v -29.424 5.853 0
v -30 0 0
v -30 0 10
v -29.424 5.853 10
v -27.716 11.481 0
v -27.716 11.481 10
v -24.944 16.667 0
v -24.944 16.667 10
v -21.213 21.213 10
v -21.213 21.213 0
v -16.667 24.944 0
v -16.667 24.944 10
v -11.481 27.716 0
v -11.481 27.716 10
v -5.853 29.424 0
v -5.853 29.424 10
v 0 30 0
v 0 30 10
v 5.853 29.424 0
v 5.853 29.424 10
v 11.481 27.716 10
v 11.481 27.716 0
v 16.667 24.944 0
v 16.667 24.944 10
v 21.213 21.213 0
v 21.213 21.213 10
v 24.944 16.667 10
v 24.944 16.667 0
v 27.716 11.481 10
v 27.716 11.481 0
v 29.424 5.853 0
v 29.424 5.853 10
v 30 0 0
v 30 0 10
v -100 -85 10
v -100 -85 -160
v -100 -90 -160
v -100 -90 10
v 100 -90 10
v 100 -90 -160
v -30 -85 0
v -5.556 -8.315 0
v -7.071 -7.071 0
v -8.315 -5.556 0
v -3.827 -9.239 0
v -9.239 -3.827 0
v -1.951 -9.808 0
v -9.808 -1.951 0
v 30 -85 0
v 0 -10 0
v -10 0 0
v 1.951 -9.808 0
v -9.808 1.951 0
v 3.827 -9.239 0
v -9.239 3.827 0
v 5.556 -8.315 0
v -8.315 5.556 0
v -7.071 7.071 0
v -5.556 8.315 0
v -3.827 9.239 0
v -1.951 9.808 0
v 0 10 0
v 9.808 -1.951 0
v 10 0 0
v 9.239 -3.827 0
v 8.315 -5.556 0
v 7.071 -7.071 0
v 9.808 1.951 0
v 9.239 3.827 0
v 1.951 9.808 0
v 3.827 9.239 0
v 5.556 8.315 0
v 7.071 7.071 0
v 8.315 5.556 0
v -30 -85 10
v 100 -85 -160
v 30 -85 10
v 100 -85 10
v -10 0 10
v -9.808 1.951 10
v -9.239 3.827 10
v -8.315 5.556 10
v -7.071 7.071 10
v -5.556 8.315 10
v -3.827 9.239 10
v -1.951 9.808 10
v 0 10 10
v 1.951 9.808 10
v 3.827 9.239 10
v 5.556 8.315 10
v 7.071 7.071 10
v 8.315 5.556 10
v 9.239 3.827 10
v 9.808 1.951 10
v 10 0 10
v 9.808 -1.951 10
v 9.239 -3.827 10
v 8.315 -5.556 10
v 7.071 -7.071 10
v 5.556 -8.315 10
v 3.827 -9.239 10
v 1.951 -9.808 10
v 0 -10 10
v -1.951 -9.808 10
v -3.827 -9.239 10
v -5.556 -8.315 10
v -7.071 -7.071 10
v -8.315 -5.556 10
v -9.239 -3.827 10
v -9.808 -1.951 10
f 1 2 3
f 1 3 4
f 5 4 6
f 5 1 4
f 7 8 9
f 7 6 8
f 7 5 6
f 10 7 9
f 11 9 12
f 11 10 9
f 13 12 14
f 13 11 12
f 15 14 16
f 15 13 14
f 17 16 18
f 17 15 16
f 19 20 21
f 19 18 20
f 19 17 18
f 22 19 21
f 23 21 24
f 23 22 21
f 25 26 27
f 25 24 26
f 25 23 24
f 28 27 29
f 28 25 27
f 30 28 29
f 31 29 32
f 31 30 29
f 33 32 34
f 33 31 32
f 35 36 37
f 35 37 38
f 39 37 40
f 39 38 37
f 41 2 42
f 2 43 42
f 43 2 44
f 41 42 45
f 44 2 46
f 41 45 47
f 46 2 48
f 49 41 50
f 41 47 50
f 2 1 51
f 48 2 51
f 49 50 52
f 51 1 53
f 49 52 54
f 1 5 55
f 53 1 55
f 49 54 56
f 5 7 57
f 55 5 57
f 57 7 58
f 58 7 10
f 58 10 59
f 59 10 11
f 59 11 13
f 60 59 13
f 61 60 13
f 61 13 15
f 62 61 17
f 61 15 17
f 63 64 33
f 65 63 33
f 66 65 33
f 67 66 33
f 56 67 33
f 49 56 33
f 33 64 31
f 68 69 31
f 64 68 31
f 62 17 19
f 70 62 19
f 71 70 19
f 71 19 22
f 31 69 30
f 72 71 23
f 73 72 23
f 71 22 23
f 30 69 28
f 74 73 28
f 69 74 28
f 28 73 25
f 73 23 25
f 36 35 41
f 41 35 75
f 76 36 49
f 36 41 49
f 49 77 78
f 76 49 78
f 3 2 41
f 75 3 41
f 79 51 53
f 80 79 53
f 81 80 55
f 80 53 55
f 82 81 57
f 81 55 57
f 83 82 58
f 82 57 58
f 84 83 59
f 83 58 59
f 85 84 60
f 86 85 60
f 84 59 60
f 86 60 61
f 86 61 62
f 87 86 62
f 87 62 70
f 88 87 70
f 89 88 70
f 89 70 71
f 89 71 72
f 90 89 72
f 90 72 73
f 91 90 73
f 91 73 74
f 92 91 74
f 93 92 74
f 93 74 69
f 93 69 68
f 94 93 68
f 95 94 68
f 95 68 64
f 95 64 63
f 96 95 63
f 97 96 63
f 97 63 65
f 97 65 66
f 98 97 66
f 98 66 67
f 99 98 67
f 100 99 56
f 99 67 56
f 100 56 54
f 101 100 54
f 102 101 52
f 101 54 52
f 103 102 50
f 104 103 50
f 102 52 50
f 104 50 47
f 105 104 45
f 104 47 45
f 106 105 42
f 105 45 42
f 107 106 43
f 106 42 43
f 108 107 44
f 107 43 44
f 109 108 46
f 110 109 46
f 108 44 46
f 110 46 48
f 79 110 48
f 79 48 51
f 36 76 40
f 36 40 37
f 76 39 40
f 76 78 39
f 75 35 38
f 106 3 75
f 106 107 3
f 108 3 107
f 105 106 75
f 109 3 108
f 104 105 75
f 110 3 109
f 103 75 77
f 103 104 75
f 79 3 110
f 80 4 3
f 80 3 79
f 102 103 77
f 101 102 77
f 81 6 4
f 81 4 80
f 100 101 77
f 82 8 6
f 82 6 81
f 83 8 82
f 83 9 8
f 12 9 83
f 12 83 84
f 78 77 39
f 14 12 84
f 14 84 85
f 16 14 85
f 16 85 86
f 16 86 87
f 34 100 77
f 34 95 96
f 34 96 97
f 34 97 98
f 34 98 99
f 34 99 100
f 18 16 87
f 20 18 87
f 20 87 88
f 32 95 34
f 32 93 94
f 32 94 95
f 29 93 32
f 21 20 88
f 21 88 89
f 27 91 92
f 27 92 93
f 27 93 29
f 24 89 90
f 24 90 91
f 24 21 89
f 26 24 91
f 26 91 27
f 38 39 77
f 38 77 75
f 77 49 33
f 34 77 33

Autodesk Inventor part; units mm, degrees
ref_plane "YZ Plane" through (0, 0, 0) normal (1, 0, 0) x (0, 1, 0)
ref_plane "XZ Plane" through (0, 0, 0) normal (0, 1, 0) x (-1, 0, 0)
ref_plane "XY Plane" through (0, 0, 0) normal (0, 0, 1) x (1, 0, 0)
sketch "草圖1" plane through (0, 0, 0) normal (0, 0, 1) x (1, 0, 0)
  line L0 (0, 0) -> (0, -85) construction
  line L1 (-30, 0) -> (-30, -85)
  line L2 (30, -85) -> (30, 0)
  arc A0 (30, 0) -> (-30, 0) centre (0, 0) ccw
  arc A1 (-30, -85) -> (30, -85) centre (0, -85) ccw construction
  line L3 (-30, -85) -> (30, -85)
  point P0 (0, -42.5)
  dimension "d0" = 30
  dimension "d1" = 85
extrude "擠出1" add sketch "草圖1" along normal blind 10
sketch "草圖2" plane through (0, 0, 0) normal (0, 0, -1) x (-1, 0, 0)
  arc A0 (30, 0) -> (-30, 0) centre (0, 0) ccw projected
  circle A1 centre (0, 0) radius 10
  dimension "d4" = 20
extrude "擠出2" cut sketch "草圖2" against normal blind 10
sketch "草圖3" plane through (-30, -85, 0) normal (0, -1, 0) x (1, 0, 0)
  line L0 (0, 10) -> (60, 10) projected
  line L1 (-70, 10) -> (130, 10)
  line L2 (130, 10) -> (130, -160)
  line L3 (130, -160) -> (-70, -160)
  line L4 (-70, -160) -> (-70, 10)
  point P0 (30, 0)
  dimension "d7" = 100
  dimension "d8" = 200
  dimension "d9" = 170
extrude "擠出3" add sketch "草圖3" along normal blind 5
